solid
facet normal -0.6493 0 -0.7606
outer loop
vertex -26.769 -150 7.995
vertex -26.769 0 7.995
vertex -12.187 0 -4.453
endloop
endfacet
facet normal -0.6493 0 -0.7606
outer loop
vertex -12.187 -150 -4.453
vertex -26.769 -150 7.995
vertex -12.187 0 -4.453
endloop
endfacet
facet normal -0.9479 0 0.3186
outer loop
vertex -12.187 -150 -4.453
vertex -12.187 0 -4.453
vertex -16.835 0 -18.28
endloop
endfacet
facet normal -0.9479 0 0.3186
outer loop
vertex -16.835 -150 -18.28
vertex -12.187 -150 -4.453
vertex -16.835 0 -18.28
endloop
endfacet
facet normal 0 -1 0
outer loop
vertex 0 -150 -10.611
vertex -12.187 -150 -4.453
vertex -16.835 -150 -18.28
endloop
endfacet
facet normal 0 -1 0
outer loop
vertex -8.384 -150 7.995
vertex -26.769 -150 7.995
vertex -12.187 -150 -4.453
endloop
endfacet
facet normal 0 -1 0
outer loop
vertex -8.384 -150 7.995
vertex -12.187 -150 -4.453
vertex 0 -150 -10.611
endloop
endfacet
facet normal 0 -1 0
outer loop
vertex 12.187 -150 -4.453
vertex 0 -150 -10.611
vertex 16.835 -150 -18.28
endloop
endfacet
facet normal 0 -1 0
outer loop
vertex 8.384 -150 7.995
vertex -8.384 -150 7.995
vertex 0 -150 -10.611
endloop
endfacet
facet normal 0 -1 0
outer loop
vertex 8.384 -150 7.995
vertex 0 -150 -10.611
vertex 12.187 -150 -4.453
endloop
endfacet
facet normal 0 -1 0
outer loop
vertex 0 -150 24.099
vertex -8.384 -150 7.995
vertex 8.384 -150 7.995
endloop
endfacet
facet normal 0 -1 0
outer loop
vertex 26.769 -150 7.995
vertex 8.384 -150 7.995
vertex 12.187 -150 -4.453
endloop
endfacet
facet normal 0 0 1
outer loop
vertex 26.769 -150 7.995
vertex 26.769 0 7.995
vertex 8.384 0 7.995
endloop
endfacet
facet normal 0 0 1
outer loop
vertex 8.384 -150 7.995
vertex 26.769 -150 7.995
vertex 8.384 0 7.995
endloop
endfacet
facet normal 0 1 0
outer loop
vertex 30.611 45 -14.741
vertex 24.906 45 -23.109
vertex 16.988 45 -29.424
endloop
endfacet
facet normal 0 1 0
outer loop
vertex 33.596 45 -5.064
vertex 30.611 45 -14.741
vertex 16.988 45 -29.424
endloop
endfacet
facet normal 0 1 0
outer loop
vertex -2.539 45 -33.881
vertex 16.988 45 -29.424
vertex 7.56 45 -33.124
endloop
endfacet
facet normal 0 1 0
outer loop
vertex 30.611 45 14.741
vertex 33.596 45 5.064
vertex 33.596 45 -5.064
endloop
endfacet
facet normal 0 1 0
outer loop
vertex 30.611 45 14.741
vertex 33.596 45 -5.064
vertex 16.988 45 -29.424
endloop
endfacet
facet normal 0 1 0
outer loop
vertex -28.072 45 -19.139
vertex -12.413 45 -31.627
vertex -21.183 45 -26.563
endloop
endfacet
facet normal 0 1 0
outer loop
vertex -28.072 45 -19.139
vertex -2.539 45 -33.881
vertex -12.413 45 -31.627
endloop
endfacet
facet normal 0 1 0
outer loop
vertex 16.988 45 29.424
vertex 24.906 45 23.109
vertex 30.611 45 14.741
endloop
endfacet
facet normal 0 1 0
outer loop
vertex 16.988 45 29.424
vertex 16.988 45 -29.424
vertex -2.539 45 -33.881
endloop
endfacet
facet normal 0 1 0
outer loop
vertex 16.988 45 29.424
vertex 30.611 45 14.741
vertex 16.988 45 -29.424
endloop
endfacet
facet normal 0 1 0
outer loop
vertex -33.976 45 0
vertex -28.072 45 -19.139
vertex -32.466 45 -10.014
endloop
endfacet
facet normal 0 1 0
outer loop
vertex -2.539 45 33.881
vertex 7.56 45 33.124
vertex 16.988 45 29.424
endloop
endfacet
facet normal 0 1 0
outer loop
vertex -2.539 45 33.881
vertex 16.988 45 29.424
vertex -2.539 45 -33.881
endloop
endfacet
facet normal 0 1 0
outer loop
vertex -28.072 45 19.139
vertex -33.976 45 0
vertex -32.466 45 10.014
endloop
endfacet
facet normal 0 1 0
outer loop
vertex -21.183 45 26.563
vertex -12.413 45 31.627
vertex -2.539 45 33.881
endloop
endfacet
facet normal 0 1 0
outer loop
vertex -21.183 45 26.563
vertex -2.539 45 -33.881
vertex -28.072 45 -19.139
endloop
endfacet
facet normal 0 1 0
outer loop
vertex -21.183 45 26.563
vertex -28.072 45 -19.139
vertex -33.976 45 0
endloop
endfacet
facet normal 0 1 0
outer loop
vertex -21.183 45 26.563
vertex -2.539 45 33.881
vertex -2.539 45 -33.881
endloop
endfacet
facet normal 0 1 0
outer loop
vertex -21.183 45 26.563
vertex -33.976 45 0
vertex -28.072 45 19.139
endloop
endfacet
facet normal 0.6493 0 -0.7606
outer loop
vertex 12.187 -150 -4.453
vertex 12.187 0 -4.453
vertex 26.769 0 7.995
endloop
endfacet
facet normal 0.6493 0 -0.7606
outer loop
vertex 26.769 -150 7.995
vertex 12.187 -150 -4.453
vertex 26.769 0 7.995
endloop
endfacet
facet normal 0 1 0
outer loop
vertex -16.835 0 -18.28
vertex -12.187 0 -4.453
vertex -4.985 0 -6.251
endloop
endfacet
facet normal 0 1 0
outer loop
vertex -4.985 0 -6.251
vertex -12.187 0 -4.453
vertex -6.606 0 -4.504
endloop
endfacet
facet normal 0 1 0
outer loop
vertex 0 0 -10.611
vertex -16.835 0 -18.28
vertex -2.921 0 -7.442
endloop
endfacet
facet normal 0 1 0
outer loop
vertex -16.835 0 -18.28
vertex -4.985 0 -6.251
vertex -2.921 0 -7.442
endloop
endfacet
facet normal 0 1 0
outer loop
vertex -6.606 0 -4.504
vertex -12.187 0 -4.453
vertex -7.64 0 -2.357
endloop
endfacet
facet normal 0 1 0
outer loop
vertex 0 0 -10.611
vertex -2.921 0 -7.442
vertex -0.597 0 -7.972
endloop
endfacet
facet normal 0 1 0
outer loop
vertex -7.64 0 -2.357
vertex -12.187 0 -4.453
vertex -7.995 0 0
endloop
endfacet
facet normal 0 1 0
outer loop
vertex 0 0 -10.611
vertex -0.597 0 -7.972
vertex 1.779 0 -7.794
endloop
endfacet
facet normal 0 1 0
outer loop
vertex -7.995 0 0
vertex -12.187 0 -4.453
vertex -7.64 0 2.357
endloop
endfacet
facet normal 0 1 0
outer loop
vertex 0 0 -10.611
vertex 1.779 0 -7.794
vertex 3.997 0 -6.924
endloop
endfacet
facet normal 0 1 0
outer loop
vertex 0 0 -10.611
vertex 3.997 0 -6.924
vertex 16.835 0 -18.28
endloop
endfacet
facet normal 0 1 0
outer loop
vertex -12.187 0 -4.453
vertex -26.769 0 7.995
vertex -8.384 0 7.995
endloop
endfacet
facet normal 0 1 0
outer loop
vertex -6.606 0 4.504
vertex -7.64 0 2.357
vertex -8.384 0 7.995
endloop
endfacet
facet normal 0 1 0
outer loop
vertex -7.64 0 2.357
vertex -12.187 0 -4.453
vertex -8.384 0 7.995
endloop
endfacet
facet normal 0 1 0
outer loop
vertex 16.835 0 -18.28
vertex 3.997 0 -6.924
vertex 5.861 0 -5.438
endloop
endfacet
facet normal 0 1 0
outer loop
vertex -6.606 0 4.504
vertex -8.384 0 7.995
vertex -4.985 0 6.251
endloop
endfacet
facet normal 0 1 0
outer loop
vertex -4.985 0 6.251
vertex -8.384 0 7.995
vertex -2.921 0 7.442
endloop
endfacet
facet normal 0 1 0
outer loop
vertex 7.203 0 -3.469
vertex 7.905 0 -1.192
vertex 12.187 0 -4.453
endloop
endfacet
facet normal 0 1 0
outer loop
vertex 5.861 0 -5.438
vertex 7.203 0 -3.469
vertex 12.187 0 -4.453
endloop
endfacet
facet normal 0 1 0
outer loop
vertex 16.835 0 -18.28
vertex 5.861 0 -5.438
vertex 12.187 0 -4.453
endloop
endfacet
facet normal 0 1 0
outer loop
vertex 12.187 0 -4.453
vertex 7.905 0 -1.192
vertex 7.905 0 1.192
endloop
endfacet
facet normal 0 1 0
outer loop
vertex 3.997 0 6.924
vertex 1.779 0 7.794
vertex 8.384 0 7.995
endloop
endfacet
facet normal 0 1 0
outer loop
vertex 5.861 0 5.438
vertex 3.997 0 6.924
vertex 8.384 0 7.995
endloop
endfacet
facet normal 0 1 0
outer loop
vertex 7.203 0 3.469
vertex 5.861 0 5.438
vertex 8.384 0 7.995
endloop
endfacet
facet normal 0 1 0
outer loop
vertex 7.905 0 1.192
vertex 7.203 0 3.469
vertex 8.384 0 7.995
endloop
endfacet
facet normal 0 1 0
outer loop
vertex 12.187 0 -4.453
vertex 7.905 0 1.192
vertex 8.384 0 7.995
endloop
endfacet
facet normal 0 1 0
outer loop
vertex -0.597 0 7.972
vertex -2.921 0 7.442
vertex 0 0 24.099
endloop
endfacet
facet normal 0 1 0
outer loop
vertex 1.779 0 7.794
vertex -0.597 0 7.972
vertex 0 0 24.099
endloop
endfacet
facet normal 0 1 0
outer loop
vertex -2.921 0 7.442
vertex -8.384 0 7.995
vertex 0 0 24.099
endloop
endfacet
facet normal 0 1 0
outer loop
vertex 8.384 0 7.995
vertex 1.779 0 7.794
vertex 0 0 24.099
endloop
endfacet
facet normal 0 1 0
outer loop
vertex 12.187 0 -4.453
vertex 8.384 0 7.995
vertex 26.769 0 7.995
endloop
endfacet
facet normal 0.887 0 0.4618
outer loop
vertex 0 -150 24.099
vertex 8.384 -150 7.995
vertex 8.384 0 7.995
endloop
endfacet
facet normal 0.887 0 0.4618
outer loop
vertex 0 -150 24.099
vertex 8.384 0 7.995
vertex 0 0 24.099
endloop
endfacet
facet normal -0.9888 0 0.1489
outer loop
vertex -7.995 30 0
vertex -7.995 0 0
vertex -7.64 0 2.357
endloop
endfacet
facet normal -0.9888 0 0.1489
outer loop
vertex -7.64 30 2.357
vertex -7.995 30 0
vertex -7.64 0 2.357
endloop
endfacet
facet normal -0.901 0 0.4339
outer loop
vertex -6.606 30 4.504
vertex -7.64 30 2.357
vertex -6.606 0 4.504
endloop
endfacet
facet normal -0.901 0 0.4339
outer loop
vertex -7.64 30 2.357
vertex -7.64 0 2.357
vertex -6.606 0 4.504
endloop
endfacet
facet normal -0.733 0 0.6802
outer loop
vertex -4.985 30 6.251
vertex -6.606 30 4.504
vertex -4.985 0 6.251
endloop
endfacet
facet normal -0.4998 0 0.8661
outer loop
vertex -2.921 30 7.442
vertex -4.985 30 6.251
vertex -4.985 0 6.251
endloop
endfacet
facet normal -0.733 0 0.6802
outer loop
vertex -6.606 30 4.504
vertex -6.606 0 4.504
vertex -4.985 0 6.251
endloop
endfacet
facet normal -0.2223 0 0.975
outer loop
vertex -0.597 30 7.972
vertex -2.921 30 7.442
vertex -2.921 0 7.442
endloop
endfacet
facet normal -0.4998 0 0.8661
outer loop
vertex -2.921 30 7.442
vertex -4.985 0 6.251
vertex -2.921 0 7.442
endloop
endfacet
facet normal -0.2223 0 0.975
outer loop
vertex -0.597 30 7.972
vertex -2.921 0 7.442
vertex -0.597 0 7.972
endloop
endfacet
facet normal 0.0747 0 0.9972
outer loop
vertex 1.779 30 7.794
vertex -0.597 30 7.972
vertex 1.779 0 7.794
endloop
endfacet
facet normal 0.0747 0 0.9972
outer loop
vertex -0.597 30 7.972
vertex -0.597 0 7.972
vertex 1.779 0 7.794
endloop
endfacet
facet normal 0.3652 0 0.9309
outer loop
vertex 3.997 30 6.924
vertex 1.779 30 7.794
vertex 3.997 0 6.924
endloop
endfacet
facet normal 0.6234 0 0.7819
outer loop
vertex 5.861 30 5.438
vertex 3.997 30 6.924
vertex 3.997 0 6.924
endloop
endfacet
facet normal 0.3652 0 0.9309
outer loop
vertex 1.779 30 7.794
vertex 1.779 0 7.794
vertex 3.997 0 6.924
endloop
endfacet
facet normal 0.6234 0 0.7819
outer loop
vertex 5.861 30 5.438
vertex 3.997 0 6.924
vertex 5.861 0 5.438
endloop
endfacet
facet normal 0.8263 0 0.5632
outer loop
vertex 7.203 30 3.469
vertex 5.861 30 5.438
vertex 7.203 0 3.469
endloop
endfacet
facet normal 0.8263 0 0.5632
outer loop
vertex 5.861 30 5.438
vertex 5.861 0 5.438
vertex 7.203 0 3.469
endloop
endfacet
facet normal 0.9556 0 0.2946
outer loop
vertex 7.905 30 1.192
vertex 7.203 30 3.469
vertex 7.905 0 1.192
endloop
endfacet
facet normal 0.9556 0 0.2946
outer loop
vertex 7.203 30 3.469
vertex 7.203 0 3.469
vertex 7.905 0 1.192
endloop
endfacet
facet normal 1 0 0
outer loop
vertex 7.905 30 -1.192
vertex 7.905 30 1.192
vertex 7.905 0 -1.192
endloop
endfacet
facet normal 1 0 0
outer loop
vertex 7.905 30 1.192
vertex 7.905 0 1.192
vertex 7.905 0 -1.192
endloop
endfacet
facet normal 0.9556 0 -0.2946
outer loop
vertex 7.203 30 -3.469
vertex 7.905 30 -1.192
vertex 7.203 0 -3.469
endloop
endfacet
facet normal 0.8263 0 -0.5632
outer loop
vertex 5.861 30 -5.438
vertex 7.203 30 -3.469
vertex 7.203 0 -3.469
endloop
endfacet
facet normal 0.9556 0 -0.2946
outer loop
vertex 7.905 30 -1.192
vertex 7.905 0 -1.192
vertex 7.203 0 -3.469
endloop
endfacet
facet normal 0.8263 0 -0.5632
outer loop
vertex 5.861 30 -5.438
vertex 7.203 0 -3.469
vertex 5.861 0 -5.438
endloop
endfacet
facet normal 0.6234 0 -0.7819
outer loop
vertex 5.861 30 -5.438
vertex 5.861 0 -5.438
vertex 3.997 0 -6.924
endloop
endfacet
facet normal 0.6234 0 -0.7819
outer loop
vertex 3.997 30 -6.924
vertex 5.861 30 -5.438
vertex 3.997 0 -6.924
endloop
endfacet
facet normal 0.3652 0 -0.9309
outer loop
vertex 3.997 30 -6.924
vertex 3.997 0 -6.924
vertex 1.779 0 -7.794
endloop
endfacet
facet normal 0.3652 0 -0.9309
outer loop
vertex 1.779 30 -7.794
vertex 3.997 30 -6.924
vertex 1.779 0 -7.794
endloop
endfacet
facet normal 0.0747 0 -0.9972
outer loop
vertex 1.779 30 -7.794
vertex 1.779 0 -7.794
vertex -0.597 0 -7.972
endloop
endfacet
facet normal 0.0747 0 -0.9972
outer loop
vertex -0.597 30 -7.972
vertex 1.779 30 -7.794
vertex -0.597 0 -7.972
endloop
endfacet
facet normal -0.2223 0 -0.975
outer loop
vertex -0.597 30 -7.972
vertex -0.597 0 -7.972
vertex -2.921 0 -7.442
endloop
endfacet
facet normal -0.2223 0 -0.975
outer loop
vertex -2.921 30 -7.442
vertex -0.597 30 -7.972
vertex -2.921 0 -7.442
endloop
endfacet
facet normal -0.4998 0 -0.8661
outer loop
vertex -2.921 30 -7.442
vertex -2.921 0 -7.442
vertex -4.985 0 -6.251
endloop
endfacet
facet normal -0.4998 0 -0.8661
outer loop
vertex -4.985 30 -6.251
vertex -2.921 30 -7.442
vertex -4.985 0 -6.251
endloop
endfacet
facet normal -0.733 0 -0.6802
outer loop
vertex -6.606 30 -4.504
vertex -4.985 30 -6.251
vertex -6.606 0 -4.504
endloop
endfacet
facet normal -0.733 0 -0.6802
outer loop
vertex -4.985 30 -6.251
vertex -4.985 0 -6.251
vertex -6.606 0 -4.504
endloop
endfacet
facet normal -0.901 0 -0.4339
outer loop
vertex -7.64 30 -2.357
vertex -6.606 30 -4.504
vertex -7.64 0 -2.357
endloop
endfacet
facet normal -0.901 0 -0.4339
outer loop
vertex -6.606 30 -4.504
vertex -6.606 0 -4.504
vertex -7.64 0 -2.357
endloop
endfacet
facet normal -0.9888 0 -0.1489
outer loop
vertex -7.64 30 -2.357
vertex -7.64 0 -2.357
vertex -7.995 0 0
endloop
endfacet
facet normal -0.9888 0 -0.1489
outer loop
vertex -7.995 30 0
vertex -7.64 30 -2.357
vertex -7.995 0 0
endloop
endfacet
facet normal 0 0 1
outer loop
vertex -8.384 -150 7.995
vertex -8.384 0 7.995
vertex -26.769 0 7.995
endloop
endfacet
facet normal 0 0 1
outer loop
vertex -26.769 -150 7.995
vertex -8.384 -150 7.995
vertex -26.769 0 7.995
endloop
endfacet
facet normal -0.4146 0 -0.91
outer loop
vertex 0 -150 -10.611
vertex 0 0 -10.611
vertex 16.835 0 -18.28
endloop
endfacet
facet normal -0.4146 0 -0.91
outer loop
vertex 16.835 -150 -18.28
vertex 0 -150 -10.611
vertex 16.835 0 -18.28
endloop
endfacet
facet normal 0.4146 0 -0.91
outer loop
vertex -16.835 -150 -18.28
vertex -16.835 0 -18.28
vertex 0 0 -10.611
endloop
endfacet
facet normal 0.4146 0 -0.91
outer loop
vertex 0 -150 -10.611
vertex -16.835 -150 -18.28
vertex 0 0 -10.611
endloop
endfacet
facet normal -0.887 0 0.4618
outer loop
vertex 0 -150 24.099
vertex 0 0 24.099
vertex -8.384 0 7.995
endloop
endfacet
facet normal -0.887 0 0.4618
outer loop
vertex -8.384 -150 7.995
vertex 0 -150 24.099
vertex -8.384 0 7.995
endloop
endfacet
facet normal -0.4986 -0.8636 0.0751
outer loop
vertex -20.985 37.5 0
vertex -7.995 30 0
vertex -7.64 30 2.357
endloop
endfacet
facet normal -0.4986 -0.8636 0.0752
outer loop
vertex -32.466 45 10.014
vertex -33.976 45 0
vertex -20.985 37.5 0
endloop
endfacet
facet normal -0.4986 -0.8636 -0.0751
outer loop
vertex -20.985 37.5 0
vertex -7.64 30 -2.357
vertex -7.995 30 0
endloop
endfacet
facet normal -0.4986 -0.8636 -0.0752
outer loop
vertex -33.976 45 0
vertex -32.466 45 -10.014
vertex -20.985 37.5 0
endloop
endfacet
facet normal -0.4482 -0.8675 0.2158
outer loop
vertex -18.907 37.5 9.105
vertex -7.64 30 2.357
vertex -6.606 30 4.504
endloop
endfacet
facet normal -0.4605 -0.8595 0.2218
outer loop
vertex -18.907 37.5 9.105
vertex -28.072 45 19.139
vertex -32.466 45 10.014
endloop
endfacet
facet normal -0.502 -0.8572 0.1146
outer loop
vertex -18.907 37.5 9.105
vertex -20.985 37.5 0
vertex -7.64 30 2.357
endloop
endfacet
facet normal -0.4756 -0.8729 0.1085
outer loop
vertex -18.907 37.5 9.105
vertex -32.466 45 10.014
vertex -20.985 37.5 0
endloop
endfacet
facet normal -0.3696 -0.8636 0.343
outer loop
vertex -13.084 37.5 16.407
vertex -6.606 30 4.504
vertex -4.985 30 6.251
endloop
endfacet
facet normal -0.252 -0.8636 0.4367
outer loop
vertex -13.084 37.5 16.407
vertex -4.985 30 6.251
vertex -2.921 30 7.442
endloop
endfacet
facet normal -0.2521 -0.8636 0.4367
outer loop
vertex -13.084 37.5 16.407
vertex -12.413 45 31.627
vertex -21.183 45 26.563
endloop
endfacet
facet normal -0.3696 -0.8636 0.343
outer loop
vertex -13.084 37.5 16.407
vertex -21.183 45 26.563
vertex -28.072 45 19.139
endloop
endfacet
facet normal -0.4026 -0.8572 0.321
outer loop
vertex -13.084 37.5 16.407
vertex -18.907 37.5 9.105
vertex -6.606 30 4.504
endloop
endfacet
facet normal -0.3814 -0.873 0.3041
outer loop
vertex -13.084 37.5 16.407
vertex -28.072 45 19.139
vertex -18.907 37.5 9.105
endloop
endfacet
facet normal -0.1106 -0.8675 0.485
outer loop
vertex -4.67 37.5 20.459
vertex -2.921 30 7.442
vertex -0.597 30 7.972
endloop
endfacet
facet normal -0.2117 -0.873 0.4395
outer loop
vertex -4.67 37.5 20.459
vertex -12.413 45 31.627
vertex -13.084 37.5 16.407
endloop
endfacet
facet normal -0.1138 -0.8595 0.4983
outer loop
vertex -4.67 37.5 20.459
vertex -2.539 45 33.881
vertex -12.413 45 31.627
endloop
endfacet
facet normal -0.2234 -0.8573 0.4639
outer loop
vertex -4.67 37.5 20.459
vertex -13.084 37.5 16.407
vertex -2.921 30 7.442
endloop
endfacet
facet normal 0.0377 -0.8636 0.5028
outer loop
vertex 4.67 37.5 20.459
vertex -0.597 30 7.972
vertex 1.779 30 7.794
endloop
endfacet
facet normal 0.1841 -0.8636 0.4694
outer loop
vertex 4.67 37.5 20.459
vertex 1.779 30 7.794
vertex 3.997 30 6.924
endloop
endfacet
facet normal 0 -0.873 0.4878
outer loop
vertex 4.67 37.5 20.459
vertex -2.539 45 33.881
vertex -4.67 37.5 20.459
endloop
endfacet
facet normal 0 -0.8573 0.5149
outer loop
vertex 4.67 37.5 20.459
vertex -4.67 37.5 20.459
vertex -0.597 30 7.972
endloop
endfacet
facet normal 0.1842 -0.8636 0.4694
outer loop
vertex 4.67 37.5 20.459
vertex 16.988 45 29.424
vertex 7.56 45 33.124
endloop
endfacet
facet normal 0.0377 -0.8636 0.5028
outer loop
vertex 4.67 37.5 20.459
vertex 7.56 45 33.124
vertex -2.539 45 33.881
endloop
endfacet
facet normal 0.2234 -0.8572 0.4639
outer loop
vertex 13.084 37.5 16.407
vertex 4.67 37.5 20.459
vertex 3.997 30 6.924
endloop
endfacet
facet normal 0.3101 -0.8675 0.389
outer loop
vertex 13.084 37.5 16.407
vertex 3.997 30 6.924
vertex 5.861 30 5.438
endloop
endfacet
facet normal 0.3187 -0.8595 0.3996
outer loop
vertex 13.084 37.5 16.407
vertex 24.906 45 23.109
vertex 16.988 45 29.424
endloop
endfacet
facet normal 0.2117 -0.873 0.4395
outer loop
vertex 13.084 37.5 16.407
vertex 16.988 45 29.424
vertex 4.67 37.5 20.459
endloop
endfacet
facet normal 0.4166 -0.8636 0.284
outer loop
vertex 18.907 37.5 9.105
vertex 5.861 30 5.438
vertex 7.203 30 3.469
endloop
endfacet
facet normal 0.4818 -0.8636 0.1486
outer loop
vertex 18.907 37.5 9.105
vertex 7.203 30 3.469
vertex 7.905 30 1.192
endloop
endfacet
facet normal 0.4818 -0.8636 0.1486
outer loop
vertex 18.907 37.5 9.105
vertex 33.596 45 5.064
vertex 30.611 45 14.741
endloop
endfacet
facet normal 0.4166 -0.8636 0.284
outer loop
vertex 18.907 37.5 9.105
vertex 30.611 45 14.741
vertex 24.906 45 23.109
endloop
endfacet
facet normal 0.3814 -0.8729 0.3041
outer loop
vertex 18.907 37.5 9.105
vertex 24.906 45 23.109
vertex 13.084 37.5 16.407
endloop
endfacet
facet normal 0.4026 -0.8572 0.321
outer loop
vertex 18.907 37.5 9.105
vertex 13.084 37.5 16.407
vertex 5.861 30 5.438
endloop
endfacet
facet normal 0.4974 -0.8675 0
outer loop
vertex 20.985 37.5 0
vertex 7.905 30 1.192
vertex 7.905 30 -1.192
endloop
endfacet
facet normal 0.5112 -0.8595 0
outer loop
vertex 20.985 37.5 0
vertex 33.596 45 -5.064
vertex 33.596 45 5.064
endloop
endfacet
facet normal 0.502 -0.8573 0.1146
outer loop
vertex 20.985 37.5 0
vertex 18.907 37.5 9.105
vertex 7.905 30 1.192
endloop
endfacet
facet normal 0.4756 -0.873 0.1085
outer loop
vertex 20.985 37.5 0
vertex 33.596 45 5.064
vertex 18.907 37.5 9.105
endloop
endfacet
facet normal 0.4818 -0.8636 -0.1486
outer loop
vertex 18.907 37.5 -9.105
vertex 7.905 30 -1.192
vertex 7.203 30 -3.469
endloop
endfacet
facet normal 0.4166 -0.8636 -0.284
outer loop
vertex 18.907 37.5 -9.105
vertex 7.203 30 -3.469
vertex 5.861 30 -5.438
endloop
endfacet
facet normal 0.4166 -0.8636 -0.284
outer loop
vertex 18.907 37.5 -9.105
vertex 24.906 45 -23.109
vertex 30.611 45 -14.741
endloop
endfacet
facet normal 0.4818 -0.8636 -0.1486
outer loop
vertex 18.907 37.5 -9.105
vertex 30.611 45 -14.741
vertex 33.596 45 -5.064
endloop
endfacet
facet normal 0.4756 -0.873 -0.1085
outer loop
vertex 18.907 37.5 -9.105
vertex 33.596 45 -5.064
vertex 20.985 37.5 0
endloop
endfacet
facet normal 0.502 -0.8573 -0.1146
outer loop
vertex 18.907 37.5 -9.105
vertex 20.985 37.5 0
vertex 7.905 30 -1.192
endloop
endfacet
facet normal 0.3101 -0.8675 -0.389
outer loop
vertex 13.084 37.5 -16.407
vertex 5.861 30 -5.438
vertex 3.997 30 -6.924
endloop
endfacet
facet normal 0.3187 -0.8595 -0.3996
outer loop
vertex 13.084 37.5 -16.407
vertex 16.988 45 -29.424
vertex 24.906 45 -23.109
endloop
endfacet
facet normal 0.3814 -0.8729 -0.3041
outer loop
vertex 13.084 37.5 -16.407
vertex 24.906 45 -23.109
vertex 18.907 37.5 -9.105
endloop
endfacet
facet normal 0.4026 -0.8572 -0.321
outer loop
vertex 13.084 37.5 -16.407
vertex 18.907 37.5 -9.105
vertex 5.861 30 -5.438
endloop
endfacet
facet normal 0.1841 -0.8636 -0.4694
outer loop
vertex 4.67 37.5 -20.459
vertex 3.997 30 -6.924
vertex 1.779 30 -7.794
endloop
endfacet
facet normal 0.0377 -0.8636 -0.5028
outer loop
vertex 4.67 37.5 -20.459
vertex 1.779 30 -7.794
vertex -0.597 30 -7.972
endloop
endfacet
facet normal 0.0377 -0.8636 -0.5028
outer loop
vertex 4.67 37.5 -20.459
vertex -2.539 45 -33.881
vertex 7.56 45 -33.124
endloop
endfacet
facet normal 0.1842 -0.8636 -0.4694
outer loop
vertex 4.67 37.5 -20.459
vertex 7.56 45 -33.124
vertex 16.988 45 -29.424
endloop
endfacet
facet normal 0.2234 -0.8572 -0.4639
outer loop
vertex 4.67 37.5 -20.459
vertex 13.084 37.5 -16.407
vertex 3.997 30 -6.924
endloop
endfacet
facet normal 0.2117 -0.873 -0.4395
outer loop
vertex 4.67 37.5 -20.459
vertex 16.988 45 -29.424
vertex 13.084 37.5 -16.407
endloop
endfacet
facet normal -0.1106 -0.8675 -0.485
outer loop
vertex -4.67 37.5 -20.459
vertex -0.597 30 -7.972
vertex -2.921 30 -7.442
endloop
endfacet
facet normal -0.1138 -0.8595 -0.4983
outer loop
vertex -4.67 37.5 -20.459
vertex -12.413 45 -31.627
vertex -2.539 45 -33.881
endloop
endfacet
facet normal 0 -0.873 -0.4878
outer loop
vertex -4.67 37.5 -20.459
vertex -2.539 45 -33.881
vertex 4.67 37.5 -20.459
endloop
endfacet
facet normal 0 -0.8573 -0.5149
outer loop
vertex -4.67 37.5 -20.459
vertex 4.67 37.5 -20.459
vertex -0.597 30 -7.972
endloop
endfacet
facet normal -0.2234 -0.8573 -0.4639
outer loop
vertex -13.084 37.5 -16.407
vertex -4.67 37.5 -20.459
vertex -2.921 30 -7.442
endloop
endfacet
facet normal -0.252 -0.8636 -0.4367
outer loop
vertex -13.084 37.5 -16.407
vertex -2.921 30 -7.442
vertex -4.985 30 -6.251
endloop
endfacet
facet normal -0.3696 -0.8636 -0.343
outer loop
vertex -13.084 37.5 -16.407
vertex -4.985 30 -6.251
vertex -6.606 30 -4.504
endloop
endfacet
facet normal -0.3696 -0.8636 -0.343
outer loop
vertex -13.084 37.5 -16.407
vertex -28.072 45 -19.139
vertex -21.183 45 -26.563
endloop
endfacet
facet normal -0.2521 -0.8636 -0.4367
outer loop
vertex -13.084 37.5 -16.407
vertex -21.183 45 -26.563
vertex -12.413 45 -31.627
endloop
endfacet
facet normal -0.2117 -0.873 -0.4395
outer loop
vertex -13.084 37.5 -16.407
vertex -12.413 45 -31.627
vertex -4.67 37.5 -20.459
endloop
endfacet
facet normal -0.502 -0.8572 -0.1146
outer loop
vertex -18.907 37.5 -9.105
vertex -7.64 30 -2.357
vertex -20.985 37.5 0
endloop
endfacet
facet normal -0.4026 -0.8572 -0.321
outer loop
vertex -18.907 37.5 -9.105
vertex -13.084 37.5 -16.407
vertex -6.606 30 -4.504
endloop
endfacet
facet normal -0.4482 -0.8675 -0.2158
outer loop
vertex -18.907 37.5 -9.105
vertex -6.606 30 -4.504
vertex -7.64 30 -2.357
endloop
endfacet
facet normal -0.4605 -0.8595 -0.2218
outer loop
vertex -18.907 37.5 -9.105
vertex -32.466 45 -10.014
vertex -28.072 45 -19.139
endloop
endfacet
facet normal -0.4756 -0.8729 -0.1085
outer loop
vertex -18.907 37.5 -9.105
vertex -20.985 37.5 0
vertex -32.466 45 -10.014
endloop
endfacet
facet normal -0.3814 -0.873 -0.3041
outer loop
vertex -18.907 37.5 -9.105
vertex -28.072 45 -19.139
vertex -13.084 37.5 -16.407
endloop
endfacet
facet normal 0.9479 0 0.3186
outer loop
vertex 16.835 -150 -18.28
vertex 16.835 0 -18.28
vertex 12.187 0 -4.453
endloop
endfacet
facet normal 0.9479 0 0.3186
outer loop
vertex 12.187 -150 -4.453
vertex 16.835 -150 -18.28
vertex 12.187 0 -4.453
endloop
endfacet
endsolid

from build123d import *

# Parameters (mm, degrees)
F1_DEPTH  = 150
F2_R      = 7.994771935
F3_DEPTH  = 30
F3_FACE_R = 7.994771935
F4_DEPTH  = 15
F4_TAPER  = -60


with BuildPart() as f1:
    # F0 (on Front) → F1 (new body)
    with BuildSketch(Plane.XZ):
        Polygon((8.3843320608, 7.994771935), (0, 24.09890946), (-8.3843320608, 7.994771935), (-26.7688590564, 7.994771935), (-12.1869118884, -4.4532320462), (-16.8345868587, -18.2800656185), (0, -10.6114018708), (16.8345868587, -18.2800656185), (12.1869118884, -4.4532320462), (26.7688590564, 7.994771935), align=None)
    extrude(amount=F1_DEPTH)

    # F2 (on face) → F3 (join)
    with BuildSketch(Plane(origin=(0, 0, 0), x_dir=(-1, 0, 0), z_dir=(0, 1, 0))):
        Circle(F2_R)
    extrude(amount=F3_DEPTH)

    # F3_face (on face) → F4 (join)
    with BuildSketch(Plane(origin=(0, 30, 0), x_dir=(-1, 0, 0), z_dir=(0, 1, 0))):
        Circle(F3_FACE_R)
    extrude(amount=F4_DEPTH, taper=F4_TAPER)


solid = f1.part
